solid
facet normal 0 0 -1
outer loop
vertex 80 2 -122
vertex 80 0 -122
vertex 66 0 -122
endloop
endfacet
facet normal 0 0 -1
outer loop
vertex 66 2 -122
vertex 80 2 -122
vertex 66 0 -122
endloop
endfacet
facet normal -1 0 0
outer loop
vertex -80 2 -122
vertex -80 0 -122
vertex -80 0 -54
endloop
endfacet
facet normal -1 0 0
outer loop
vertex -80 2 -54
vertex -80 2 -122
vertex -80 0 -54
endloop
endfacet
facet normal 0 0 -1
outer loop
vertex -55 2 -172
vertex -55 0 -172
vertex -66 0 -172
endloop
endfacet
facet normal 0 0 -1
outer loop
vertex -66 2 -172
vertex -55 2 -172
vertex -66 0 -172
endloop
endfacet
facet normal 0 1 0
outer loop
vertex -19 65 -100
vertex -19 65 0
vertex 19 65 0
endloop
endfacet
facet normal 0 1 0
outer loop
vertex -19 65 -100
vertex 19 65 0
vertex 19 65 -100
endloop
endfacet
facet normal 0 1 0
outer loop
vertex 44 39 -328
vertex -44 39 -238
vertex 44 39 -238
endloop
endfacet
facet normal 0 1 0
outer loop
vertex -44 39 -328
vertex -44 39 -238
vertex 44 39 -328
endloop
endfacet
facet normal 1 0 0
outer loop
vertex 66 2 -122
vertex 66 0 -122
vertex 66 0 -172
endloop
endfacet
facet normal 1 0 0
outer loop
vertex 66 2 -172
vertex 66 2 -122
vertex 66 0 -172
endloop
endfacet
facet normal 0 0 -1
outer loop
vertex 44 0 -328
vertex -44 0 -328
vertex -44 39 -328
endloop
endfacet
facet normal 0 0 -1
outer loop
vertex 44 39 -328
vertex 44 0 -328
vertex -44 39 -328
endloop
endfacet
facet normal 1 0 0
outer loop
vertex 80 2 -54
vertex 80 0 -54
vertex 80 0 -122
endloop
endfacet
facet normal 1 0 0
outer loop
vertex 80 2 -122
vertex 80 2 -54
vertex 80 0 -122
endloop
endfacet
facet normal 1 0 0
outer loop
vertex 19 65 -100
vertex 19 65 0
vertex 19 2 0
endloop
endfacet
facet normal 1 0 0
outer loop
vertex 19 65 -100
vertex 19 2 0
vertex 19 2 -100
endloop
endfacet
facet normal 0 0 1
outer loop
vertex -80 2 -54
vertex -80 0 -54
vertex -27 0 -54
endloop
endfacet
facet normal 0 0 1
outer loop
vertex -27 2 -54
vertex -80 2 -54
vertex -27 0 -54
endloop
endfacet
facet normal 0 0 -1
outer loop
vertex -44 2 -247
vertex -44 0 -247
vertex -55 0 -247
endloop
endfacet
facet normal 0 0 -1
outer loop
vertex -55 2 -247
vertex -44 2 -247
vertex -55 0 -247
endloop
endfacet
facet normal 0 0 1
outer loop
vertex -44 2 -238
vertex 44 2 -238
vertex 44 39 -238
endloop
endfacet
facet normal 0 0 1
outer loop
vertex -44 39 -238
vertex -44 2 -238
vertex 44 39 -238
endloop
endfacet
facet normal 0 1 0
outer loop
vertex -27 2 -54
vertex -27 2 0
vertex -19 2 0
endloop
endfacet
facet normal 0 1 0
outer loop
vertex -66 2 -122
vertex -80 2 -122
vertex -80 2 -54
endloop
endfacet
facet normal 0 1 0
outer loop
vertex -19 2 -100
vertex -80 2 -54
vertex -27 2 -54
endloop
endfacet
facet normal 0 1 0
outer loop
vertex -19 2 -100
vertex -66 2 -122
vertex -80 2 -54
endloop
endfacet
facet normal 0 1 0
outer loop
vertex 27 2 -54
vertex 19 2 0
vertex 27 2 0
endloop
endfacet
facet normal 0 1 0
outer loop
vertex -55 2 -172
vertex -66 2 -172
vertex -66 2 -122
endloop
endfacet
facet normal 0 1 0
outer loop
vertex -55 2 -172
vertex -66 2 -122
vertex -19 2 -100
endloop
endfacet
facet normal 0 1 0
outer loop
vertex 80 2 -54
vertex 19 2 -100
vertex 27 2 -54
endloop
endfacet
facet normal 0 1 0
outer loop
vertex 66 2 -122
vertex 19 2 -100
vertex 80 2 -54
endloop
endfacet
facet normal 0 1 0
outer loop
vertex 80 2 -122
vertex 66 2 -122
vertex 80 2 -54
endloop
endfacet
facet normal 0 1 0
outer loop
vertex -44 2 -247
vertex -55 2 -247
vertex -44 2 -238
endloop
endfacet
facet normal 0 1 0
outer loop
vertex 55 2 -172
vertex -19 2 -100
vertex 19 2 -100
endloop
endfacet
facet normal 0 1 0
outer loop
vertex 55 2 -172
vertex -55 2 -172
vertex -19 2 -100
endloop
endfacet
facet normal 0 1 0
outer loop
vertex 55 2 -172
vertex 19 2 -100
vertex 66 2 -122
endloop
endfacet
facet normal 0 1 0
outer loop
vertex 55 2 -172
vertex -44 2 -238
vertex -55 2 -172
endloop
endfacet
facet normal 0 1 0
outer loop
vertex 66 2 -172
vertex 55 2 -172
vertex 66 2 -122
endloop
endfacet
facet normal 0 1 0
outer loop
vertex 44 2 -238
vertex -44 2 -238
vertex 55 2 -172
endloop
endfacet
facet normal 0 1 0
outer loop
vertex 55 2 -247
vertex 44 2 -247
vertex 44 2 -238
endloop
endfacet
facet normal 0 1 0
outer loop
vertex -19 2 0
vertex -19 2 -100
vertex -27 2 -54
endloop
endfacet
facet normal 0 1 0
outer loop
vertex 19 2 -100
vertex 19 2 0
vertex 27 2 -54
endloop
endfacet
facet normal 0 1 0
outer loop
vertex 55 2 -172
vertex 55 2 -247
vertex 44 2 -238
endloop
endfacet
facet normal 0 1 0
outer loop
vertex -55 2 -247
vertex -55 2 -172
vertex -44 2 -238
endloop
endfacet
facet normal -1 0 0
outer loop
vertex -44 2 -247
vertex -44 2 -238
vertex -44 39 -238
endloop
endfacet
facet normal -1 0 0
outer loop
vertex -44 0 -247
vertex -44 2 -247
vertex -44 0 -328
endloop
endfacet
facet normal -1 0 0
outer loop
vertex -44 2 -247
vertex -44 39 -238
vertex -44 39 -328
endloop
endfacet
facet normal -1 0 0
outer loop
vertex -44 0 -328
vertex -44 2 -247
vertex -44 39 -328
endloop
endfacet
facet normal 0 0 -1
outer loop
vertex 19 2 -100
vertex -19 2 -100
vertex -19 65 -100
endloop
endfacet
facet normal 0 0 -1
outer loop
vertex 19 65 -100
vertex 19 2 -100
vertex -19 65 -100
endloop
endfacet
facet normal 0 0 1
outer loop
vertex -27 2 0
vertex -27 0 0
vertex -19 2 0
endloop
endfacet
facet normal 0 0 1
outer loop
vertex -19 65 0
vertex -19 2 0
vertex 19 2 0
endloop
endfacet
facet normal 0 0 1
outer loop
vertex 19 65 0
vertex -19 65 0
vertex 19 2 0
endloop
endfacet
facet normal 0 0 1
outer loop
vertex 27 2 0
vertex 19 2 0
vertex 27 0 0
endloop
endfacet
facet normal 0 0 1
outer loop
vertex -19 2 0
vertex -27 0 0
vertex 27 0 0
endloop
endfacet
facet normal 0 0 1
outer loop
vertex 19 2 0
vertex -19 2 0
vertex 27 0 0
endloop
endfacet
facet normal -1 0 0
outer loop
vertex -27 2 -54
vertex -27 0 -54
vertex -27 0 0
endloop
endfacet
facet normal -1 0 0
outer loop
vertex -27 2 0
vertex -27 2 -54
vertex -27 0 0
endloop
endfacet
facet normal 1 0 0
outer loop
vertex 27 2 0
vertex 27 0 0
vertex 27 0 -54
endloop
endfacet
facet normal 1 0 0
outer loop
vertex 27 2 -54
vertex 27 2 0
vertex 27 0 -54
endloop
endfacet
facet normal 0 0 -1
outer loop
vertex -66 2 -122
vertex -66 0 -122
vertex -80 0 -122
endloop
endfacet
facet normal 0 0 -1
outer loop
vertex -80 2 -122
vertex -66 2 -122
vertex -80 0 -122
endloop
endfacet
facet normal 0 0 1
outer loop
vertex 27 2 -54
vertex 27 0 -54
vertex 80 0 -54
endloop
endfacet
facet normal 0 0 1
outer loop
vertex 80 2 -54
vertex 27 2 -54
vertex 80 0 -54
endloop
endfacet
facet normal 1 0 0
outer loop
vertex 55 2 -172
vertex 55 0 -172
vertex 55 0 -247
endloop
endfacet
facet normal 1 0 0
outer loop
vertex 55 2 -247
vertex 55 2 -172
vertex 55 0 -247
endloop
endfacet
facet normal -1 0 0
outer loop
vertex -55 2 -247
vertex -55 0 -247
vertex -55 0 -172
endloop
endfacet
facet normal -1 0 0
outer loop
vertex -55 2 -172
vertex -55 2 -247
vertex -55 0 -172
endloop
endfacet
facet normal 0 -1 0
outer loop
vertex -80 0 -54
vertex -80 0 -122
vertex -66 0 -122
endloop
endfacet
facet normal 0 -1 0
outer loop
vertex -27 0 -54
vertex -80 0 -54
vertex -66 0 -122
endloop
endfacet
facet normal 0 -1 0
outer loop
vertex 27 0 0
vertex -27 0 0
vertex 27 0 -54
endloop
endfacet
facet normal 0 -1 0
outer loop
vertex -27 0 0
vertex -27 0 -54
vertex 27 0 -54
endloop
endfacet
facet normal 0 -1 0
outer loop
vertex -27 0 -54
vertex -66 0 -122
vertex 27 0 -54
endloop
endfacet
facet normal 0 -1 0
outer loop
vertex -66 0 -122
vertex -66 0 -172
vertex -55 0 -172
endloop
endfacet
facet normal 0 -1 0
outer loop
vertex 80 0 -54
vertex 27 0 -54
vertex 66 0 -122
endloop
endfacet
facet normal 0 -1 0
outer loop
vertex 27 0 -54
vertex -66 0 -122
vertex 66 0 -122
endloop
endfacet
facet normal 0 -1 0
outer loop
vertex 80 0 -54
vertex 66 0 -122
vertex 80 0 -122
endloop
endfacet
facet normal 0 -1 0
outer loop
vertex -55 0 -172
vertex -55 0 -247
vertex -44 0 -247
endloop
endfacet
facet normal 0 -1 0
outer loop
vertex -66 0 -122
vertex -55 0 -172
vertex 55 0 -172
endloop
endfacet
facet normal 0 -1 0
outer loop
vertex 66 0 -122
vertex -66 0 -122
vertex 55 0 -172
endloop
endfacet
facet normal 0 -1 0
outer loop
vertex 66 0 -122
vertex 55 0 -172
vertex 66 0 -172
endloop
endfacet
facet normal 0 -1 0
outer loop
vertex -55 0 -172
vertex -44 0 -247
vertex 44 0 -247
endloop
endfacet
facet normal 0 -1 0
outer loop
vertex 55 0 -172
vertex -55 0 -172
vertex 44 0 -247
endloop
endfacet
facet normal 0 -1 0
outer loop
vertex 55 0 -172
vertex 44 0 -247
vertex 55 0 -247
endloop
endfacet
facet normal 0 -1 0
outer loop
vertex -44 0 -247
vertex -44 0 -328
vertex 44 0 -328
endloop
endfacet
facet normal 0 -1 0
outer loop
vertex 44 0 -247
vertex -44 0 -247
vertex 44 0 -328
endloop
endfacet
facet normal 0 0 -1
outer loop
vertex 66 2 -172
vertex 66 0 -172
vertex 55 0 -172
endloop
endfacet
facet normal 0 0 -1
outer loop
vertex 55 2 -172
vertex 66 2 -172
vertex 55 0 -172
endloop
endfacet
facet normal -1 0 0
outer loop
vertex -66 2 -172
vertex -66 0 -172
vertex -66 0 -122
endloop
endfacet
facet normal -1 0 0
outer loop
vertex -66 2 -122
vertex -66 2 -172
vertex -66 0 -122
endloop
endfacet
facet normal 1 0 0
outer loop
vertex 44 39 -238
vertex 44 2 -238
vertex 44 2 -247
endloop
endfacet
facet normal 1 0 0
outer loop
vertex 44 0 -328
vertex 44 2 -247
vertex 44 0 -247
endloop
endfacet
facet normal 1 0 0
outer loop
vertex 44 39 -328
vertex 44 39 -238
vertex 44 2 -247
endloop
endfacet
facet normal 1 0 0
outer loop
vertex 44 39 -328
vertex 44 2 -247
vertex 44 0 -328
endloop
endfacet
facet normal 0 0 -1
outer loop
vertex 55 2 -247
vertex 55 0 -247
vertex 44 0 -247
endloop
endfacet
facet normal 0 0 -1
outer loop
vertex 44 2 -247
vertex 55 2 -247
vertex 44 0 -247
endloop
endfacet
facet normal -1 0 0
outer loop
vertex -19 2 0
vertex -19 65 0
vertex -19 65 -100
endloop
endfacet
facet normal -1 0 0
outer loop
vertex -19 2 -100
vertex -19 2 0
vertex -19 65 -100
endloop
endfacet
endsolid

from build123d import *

# Parameters (mm, degrees)
BOSS_EXTRUDE1_DEPTH      = 2
BOSS_EXTRUDE2_DEPTH      = 19
BOSS_EXTRUDE2_DEPTH_BACK = 19
SKETCH3_W                = 100
SKETCH3_H                = 63
BOSS_EXTRUDE3_START      = -44
SKETCH6_W                = 90
SKETCH6_H                = 37
BOSS_EXTRUDE3_DEPTH      = 88


with BuildPart() as part:
    # Sketch2 → Boss-Extrude1 (new body)
    with BuildSketch(Plane(origin=(0, 0, 0), x_dir=(1, 0, 0), z_dir=(0, 1, 0))):
        Polygon((-27, 0), (27, 0), (27, 54), (80, 54), (80, 122), (66, 122), (66, 172), (55, 172), (55, 247), (44, 247), (44, 328), (-44, 328), (-44, 247), (-55, 247), (-55, 172), (-66, 172), (-66, 122), (-80, 122), (-80, 54), (-27, 54), align=None)
    extrude(amount=BOSS_EXTRUDE1_DEPTH)

    # Sketch3 → Boss-Extrude2 (add, two sides: drawn at the far end of the back side and taken through both)
    with BuildSketch(Plane(origin=(0, 0, 0), x_dir=(0, 0, -1), z_dir=(1, 0, 0)).offset(-BOSS_EXTRUDE2_DEPTH_BACK)):
        with Locations((50, 33.5)):
            Rectangle(SKETCH3_W, SKETCH3_H)
    extrude(amount=BOSS_EXTRUDE2_DEPTH + BOSS_EXTRUDE2_DEPTH_BACK)

    # Sketch6 → Boss-Extrude3 (add)
    with BuildSketch(Plane(origin=(0, 0, 0), x_dir=(0, 0, -1), z_dir=(1, 0, 0)).offset(BOSS_EXTRUDE3_START)):
        with Locations((283, 20.5)):
            Rectangle(SKETCH6_W, SKETCH6_H)
    extrude(amount=BOSS_EXTRUDE3_DEPTH)


solid = part.part
